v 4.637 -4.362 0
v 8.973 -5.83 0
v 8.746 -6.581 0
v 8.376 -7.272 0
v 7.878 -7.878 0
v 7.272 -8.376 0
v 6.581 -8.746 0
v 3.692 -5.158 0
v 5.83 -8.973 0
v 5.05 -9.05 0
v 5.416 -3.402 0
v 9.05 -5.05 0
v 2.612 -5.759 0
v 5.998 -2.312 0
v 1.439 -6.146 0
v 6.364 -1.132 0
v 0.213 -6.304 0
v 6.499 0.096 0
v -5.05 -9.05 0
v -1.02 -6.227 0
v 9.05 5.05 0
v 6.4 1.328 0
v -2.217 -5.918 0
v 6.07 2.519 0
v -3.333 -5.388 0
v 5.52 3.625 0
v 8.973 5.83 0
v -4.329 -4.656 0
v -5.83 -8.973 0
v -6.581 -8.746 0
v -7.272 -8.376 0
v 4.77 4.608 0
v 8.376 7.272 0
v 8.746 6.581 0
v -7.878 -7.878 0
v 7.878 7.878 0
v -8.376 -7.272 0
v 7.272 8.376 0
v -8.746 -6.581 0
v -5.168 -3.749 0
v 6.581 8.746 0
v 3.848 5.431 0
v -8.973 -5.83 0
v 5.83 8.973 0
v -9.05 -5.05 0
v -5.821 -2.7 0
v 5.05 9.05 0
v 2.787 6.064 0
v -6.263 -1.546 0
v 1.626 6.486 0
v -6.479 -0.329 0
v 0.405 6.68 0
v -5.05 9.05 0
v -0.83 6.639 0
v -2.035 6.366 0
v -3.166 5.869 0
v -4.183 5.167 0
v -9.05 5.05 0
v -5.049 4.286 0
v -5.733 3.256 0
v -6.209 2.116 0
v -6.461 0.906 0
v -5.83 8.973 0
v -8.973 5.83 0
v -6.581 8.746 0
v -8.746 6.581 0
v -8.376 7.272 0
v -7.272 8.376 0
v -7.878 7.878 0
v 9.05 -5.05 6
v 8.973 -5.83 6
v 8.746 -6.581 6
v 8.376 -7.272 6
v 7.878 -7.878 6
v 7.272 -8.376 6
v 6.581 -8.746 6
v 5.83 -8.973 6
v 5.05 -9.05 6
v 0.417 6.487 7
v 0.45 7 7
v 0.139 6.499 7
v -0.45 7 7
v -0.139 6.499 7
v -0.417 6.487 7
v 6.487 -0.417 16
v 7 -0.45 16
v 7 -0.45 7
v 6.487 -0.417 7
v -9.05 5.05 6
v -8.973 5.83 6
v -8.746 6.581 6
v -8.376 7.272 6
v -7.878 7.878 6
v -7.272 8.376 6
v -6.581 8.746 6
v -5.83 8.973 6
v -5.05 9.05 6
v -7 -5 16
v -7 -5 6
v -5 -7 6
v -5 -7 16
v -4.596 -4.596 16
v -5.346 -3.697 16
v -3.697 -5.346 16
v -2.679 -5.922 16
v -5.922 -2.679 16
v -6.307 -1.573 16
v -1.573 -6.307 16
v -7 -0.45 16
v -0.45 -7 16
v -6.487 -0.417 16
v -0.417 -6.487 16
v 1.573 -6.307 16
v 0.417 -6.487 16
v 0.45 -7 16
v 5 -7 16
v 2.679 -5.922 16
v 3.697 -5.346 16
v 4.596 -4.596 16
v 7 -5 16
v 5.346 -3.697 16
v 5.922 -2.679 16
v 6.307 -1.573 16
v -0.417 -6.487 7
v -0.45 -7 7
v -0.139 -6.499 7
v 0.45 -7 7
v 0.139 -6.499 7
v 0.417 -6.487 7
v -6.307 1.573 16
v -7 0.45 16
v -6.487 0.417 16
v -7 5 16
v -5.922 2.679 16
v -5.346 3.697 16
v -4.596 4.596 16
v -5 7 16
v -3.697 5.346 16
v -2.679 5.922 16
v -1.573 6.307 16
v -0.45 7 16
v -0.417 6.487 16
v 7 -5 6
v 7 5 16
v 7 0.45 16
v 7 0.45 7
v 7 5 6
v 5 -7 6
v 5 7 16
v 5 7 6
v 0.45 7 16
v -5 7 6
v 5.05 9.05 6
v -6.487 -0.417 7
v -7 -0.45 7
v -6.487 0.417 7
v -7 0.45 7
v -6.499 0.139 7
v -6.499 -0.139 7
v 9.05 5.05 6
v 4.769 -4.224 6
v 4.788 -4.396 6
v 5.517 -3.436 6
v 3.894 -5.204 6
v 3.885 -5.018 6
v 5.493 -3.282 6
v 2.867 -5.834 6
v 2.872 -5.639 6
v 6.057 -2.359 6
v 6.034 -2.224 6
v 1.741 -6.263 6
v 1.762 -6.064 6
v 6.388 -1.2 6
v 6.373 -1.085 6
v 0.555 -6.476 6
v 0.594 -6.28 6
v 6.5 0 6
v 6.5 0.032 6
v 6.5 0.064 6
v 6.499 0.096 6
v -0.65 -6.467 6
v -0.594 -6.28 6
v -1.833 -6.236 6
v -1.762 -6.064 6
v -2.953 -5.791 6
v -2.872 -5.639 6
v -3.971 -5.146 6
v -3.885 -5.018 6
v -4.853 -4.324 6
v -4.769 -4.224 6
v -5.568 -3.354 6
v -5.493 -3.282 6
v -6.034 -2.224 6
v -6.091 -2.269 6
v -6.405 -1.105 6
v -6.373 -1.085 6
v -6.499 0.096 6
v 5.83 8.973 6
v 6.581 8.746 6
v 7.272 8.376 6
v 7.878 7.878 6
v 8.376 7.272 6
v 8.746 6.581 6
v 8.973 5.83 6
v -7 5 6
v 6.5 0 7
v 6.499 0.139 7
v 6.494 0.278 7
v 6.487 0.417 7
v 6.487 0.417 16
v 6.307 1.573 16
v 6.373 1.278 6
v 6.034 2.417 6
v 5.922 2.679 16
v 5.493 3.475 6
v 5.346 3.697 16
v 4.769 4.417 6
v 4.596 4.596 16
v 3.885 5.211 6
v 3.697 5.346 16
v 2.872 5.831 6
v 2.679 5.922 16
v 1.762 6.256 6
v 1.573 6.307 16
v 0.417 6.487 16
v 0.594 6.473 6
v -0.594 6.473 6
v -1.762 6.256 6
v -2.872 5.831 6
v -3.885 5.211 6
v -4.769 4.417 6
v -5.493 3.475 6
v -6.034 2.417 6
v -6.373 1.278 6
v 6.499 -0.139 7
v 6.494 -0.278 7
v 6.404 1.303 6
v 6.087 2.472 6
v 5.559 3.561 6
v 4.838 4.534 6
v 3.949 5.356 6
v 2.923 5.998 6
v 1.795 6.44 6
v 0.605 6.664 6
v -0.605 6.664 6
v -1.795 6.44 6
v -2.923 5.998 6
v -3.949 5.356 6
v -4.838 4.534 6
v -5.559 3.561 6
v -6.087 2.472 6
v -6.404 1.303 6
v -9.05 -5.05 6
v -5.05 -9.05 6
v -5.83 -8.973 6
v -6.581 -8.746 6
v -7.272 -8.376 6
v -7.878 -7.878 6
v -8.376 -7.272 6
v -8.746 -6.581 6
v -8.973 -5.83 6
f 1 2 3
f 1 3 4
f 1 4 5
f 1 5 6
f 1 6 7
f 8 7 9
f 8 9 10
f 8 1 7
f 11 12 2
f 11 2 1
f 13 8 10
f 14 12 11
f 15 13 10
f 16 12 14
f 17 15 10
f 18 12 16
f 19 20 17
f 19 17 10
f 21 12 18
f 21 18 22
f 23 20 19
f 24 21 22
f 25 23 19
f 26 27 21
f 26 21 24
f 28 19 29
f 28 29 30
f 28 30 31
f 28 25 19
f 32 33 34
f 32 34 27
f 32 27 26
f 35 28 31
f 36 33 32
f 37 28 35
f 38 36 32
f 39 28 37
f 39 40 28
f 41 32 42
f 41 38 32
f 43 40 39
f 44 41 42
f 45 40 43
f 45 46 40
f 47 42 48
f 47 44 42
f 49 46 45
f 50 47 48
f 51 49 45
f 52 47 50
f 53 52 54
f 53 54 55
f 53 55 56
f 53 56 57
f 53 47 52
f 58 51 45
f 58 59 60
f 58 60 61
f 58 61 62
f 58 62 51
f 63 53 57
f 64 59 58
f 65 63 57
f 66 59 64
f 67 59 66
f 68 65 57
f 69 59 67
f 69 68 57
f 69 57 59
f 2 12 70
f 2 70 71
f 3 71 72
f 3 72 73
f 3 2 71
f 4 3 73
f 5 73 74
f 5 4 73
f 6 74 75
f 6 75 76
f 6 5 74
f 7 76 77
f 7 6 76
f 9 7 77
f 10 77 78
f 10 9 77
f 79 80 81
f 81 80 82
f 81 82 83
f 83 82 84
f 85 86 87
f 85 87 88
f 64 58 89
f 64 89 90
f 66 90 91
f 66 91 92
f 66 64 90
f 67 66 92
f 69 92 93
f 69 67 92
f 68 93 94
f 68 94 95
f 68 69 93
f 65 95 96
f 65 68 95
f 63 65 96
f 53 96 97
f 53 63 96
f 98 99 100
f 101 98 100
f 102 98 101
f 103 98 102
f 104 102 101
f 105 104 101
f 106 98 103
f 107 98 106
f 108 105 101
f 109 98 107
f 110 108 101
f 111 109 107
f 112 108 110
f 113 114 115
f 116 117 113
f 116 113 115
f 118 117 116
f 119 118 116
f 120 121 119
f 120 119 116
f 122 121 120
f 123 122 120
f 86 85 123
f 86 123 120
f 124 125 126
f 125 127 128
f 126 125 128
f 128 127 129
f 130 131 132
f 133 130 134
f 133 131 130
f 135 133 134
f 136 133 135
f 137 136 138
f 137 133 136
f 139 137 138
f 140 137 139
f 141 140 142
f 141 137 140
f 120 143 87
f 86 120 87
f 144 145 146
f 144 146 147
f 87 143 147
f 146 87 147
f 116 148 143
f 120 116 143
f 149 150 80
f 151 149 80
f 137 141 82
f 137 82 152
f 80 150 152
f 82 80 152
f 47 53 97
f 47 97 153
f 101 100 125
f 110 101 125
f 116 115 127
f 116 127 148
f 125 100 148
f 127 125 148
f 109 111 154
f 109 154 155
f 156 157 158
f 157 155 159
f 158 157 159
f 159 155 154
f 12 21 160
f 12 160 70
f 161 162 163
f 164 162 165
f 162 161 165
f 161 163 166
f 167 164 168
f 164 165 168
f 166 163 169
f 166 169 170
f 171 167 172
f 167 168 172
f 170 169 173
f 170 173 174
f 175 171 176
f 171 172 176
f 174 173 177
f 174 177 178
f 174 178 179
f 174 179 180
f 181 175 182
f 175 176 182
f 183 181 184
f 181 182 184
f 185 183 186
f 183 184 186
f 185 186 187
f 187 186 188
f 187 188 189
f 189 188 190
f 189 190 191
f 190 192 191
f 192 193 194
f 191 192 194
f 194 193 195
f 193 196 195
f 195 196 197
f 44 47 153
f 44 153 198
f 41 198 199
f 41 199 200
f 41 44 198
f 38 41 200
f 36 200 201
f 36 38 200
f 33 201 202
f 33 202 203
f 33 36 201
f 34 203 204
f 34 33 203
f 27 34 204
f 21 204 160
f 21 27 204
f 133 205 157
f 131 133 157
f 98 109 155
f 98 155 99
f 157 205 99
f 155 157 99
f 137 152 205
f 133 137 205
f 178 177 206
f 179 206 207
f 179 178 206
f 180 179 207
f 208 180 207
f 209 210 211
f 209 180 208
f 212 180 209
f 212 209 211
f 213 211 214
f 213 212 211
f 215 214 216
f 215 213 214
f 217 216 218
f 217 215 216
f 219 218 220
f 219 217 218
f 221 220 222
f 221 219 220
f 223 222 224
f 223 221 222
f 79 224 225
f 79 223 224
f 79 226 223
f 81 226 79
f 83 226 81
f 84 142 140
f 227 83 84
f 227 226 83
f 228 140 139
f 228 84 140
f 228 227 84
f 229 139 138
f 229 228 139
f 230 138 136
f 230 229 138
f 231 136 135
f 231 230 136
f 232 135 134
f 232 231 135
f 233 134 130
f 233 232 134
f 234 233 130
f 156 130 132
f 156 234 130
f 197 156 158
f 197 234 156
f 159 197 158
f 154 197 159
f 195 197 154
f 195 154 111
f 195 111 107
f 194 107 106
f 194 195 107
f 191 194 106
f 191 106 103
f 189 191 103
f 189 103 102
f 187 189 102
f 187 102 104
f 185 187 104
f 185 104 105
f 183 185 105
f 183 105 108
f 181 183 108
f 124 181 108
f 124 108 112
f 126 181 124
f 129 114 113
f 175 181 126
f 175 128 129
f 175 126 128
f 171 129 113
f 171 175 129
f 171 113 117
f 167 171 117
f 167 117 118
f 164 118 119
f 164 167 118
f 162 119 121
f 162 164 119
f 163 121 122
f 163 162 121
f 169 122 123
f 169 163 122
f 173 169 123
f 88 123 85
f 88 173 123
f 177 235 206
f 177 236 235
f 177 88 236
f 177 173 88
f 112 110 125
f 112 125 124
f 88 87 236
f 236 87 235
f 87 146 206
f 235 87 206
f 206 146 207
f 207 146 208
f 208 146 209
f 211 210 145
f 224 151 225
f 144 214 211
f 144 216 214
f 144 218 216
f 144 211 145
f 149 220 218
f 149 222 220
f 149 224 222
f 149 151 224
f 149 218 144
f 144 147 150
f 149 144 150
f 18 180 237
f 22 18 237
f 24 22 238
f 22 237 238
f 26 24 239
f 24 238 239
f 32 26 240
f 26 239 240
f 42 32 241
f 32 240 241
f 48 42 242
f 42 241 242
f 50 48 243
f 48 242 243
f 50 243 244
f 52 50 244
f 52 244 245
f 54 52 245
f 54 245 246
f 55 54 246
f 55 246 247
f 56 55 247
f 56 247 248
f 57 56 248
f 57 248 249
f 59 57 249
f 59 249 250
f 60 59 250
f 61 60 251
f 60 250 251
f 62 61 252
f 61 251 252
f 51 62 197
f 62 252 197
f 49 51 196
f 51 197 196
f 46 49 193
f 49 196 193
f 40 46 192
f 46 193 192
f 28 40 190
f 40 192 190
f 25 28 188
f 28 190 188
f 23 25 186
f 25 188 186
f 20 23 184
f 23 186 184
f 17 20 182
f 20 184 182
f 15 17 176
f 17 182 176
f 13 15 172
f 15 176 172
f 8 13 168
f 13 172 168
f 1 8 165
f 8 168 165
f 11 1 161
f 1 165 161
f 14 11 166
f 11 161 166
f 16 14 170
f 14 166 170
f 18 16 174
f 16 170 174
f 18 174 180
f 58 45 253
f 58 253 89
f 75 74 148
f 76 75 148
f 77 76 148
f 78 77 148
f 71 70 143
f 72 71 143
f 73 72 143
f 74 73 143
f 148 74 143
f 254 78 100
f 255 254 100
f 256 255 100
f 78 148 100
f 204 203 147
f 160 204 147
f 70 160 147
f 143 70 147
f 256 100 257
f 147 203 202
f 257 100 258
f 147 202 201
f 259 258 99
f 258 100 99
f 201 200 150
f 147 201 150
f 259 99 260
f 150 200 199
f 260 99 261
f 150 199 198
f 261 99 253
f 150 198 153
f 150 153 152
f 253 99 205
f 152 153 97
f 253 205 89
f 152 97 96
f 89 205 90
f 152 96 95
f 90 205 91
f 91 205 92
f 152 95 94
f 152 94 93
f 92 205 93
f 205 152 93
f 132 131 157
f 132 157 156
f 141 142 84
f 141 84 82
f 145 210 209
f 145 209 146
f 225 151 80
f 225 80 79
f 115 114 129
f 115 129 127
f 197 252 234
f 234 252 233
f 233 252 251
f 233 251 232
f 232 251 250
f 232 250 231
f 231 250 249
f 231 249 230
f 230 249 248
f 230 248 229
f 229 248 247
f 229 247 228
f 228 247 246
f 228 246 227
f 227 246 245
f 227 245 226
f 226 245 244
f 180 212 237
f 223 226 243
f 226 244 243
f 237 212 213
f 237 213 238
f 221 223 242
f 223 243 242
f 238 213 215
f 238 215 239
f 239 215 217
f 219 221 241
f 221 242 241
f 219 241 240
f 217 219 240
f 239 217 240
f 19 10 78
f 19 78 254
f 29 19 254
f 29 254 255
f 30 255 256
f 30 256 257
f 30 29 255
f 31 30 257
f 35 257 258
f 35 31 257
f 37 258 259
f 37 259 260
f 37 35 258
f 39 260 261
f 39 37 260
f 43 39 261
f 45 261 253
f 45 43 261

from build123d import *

# Parameters (mm, degrees)
BOSS_EXTRUDE1_DEPTH = 6
SKETCH3_R           = 6.5
BOSS_EXTRUDE2_DEPTH = 10
CUT_EXTRUDE7_DEPTH  = 9
CIRPATTERN1_COUNT   = 4
SKETCH12_R          = 6.5
CUT_EXTRUDE8_DEPTH  = 30


with BuildPart() as part:
    # Sketch1 → Boss-Extrude1 (new body)
    with BuildSketch(Plane.XY):
        with BuildLine():
            Line((-5.05, 9.05), (5.05, 9.05))
            ThreePointArc((5.05, 9.05), (7.878427125, 7.878427125), (9.05, 5.05))
            Line((9.05, 5.05), (9.05, -5.05))
            ThreePointArc((9.05, -5.05), (7.878427125, -7.878427125), (5.05, -9.05))
            Line((5.05, -9.05), (-5.05, -9.05))
            ThreePointArc((-5.05, -9.05), (-7.878427125, -7.878427125), (-9.05, -5.05))
            Line((-9.05, -5.05), (-9.05, 5.05))
            ThreePointArc((-9.05, 5.05), (-7.878427125, 7.878427125), (-5.05, 9.05))
        make_face()
    extrude(amount=BOSS_EXTRUDE1_DEPTH)

    # Sketch3 → Boss-Extrude2 (add)
    with BuildSketch(Plane.XY.offset(6)):
        Polygon((-5, -7), (5, -7), (7, -5), (7, 5), (5, 7), (-5, 7), (-7, 5), (-7, -5), align=None)
        Circle(SKETCH3_R, mode=Mode.SUBTRACT)
    extrude(amount=BOSS_EXTRUDE2_DEPTH)

    # Sketch11 → Cut-Extrude7 (cut)
    with BuildSketch(Plane.XY.offset(16)):
        Polygon((0, 0), (7, 0.45), (7, -0.45), align=None)
    cut_extrude7 = extrude(amount=-CUT_EXTRUDE7_DEPTH, mode=Mode.SUBTRACT)

    # CirPattern1: Cut-Extrude7 ×4 about axis
    cirpattern1_axis = Axis((0, 0, 16), (0, 0, -1))
    for i in range(1, CIRPATTERN1_COUNT):
        add(cut_extrude7.rotate(cirpattern1_axis, i * 360 / CIRPATTERN1_COUNT), mode=Mode.SUBTRACT)

    # Sketch12 → Cut-Extrude8 (cut)
    with BuildSketch(Plane.XY.offset(6)):
        with Locations(Location((0, 0.192488852, 0), (0, 0, 359.151599859))):
            Circle(SKETCH12_R)
    extrude(amount=-CUT_EXTRUDE8_DEPTH, mode=Mode.SUBTRACT)


solid = part.part
